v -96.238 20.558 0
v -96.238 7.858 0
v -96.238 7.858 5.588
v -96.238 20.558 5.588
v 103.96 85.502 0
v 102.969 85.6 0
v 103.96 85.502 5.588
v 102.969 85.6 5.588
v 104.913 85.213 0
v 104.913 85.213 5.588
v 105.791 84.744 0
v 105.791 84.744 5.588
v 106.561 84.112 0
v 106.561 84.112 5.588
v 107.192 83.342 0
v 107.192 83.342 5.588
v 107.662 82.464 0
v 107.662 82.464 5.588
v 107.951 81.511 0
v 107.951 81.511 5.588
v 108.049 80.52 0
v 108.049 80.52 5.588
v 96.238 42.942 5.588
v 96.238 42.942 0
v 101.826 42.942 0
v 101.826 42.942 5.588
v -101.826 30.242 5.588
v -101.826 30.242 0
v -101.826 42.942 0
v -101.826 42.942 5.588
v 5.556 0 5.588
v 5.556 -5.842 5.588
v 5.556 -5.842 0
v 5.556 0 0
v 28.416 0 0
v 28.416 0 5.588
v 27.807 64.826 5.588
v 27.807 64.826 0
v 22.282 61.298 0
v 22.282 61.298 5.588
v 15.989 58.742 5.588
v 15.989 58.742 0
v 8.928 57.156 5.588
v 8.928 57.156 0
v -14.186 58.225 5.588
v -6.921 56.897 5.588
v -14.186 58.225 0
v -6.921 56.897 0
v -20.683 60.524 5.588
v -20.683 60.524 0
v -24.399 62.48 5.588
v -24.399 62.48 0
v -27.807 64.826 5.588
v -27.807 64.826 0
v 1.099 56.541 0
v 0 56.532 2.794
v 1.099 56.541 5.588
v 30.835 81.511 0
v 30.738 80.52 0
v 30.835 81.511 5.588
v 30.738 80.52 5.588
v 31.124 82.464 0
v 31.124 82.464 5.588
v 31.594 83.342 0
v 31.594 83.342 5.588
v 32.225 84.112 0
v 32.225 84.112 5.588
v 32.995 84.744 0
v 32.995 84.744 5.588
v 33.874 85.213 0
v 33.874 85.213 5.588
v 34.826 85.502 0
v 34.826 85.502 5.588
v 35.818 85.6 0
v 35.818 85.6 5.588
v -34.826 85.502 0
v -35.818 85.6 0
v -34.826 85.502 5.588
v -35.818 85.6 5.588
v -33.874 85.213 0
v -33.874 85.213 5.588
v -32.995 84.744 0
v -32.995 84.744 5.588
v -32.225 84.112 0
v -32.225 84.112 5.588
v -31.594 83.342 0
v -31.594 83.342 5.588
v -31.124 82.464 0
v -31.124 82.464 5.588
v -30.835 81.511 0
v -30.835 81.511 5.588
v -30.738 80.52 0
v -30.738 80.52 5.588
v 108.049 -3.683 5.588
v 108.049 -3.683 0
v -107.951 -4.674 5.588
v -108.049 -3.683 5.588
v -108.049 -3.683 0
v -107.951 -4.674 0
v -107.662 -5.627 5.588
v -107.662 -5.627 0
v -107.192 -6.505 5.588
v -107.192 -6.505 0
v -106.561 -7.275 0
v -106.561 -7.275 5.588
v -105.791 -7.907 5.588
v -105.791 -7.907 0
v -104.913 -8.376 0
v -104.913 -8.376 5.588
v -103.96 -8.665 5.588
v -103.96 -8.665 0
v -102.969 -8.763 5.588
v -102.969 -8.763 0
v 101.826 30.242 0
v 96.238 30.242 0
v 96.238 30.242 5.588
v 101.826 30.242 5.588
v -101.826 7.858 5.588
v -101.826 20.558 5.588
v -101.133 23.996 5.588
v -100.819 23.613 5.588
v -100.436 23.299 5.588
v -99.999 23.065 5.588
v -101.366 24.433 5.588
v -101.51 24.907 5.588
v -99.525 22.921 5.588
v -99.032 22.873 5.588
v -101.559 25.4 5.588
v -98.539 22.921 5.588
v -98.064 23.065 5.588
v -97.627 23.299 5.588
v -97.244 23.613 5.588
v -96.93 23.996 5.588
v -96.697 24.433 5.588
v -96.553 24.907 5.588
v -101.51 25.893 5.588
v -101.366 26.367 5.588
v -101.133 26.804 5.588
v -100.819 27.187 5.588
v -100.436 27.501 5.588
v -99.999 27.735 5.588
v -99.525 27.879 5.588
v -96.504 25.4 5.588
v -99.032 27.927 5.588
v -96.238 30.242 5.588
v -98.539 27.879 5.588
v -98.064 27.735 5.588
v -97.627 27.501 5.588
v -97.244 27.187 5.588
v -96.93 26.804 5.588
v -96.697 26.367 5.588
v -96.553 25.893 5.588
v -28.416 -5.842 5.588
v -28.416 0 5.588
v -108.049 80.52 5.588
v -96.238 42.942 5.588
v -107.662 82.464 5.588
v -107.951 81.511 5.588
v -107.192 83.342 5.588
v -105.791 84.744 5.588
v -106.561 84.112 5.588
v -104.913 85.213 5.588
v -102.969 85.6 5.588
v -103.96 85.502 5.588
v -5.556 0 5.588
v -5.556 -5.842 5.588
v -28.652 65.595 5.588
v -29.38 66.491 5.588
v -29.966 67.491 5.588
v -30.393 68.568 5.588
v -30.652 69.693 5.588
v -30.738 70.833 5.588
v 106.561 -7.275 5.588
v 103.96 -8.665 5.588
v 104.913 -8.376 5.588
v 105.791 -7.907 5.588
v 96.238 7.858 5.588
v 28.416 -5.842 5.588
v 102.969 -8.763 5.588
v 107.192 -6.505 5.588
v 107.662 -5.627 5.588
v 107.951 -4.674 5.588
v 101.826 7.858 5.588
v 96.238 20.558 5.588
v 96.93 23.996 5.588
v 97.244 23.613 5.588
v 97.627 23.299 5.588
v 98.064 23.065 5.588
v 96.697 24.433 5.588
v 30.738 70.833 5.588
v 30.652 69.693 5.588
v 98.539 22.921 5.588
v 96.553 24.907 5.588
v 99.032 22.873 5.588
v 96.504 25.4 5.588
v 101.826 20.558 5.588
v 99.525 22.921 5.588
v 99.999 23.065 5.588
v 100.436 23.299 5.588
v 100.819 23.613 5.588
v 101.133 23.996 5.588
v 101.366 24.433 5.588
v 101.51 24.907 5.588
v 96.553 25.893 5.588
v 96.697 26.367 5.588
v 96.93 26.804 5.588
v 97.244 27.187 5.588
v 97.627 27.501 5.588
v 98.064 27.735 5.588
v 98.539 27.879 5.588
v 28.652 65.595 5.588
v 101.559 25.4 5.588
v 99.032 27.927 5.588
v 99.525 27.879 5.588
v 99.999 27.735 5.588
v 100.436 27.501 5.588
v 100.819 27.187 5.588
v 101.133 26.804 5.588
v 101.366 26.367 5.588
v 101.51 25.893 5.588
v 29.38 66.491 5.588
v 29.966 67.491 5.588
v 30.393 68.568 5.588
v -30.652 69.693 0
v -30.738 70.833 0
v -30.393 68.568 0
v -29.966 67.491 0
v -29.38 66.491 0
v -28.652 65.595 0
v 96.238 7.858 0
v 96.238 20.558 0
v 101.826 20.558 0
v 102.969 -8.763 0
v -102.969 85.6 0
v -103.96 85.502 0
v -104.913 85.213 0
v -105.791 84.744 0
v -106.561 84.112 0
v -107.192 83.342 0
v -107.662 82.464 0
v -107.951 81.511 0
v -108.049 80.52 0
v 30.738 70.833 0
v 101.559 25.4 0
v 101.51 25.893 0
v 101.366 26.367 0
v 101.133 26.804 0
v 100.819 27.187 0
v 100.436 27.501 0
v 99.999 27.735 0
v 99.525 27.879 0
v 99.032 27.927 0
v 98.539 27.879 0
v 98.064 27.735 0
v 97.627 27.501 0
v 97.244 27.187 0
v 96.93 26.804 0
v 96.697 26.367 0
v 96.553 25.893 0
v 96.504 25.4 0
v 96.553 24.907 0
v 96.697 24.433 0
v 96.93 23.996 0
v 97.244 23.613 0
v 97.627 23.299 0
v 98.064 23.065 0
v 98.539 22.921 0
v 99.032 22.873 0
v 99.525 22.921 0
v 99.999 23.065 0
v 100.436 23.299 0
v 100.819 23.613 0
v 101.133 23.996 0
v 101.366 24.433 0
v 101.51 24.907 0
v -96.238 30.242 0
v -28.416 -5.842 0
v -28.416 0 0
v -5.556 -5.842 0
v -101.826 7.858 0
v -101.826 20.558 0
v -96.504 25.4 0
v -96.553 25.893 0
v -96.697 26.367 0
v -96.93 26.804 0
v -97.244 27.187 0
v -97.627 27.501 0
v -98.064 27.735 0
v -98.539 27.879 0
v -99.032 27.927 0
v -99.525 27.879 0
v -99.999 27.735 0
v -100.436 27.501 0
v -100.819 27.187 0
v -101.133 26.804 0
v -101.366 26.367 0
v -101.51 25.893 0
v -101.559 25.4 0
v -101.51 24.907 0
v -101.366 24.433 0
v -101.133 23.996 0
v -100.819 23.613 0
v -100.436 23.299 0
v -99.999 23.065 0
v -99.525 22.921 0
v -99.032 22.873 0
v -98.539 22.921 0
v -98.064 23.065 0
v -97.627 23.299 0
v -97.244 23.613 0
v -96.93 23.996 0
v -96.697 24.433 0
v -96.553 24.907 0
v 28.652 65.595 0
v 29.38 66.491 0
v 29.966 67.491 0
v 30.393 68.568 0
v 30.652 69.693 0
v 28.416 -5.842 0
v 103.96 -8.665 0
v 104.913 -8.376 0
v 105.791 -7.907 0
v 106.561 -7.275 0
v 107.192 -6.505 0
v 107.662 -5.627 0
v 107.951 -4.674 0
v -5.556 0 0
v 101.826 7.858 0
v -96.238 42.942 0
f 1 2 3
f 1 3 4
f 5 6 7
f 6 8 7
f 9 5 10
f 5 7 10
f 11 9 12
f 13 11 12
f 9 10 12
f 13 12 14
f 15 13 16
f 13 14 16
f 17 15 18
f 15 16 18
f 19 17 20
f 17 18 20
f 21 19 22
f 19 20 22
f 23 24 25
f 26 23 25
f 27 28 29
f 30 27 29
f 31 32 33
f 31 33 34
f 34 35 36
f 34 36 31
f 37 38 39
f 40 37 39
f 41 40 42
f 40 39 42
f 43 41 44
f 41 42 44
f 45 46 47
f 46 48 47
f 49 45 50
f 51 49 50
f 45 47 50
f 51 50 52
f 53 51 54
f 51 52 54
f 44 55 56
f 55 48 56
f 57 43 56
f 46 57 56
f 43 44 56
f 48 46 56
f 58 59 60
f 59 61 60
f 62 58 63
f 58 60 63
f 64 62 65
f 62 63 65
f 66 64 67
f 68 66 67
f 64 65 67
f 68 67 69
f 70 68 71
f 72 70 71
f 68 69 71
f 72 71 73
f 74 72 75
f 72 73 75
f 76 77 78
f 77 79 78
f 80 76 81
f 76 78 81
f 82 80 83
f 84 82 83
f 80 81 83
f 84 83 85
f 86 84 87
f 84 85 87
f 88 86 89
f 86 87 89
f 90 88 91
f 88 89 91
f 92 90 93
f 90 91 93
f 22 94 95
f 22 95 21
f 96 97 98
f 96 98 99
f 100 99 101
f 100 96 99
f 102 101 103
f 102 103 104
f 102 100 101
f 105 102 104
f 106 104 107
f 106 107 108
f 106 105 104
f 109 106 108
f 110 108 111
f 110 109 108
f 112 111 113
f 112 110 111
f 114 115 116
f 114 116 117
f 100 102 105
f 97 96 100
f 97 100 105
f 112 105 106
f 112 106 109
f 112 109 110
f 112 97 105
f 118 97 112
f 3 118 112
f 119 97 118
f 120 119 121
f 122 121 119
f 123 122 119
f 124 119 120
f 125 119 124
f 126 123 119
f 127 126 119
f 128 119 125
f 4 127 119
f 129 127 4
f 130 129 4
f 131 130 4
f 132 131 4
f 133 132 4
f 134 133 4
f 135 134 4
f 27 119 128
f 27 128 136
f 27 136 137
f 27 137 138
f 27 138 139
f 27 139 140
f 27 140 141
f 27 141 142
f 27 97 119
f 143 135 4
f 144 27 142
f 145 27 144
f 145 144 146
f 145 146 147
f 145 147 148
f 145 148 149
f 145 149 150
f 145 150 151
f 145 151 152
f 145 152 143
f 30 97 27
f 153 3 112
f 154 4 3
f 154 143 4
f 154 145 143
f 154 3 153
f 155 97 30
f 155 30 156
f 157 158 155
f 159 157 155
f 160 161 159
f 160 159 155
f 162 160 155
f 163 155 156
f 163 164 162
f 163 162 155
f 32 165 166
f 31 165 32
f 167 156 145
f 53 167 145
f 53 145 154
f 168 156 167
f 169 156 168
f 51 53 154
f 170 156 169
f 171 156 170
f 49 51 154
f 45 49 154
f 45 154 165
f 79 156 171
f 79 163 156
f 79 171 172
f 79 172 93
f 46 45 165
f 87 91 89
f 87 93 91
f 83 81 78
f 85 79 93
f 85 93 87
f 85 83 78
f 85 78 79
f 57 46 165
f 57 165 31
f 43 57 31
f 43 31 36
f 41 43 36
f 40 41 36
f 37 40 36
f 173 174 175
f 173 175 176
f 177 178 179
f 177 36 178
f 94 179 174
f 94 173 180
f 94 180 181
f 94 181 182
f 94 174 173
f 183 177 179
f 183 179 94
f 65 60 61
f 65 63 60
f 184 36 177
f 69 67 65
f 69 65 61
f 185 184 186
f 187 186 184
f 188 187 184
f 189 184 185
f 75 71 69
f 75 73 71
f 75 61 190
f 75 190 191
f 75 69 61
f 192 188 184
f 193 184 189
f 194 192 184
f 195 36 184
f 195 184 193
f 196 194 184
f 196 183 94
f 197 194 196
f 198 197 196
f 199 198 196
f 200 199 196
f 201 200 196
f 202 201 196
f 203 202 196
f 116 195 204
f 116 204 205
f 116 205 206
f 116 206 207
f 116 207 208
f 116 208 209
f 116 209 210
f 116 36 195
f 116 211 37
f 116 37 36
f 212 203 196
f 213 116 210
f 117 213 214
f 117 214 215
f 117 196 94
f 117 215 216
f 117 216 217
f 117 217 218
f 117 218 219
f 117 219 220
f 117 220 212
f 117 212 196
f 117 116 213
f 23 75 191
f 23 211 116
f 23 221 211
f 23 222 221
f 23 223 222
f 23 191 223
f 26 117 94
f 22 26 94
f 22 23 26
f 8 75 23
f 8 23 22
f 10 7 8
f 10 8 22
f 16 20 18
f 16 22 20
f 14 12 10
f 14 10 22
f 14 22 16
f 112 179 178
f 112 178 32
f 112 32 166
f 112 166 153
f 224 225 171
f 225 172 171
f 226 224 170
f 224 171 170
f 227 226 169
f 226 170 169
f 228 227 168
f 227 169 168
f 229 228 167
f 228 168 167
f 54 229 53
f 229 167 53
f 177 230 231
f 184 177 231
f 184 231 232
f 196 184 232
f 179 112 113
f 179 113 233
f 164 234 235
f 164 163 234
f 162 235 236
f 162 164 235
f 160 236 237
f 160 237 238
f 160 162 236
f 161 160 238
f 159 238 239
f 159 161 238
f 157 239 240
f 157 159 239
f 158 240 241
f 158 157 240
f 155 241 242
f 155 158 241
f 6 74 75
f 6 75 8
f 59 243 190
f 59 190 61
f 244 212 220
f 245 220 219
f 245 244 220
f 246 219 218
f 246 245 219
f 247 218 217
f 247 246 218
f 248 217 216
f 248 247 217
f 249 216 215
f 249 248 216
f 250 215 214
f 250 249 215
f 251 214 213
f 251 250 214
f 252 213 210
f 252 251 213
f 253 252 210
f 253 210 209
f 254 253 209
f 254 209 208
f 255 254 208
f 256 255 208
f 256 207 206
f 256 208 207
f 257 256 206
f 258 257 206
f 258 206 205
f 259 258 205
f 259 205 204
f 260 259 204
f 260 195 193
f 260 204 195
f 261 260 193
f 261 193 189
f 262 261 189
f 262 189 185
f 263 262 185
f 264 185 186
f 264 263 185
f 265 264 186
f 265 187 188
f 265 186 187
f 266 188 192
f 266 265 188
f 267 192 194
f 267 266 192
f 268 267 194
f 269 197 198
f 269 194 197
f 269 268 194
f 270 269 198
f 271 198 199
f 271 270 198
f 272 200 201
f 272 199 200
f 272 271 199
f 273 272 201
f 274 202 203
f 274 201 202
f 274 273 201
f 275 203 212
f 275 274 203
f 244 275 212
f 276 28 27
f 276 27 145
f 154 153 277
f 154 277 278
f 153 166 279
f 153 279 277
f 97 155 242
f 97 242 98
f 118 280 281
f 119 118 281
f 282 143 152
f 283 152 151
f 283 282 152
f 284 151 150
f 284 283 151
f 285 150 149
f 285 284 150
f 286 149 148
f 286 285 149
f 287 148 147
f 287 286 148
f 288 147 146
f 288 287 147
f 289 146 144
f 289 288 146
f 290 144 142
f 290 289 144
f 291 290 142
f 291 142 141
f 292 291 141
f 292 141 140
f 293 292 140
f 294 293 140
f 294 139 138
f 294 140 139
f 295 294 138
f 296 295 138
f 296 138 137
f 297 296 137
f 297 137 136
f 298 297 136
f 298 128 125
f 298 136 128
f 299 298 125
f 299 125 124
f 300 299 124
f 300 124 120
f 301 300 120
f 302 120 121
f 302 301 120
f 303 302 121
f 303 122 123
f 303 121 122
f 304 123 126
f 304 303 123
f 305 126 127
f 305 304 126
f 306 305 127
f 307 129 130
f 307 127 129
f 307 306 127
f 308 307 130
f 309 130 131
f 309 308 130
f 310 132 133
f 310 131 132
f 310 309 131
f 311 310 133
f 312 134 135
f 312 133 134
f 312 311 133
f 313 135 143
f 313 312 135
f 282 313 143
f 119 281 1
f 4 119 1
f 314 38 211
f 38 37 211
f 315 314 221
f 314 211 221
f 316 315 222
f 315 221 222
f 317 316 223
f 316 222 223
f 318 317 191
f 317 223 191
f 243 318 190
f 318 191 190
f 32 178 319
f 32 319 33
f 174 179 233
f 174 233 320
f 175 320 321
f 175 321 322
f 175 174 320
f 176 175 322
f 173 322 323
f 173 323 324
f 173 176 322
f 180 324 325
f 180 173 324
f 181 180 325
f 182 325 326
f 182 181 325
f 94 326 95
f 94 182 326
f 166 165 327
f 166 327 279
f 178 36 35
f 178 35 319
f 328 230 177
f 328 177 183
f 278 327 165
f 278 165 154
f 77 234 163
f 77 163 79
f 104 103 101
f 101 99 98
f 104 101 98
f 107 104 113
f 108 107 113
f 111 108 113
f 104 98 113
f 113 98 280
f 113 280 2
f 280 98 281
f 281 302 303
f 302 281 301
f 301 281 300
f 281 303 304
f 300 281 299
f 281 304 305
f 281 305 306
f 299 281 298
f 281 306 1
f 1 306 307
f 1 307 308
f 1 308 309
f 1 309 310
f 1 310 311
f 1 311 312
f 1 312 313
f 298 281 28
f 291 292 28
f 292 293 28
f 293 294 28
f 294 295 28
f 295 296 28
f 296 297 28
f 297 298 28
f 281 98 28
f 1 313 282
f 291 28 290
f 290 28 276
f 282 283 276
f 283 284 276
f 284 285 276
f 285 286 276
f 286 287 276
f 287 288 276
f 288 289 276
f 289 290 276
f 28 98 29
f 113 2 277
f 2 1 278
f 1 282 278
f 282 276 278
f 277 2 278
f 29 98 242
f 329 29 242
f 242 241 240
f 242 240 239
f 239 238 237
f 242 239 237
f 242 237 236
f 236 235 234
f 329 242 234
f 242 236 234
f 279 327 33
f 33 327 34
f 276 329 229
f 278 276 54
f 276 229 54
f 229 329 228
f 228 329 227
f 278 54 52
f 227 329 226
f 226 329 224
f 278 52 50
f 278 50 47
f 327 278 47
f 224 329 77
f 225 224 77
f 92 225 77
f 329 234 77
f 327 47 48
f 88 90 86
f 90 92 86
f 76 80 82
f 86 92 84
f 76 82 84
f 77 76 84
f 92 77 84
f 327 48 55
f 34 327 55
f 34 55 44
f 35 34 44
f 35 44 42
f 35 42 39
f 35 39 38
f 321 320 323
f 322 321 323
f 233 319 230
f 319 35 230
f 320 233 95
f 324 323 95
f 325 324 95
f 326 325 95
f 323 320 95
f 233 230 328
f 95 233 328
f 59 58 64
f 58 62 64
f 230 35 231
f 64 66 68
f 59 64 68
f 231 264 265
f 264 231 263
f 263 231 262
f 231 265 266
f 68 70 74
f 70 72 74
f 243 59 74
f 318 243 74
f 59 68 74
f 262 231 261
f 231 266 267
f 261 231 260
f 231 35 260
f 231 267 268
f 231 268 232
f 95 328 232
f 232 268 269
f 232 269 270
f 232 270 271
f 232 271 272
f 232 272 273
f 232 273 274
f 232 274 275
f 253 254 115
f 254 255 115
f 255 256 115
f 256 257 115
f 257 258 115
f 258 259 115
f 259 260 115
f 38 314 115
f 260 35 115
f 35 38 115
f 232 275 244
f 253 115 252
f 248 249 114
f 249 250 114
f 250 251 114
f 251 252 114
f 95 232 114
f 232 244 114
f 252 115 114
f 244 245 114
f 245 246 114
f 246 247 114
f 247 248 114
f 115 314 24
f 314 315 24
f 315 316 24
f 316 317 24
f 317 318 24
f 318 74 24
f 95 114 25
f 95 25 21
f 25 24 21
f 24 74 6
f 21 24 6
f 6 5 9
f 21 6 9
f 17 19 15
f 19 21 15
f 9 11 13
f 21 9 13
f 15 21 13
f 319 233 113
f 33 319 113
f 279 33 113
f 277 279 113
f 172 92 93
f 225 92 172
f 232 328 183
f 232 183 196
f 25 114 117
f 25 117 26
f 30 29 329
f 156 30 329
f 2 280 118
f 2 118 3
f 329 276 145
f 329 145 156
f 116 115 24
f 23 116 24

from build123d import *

# Parameters (mm, degrees)
BOSS_EXTRUDE1_DEPTH = 5.588
FILLET1_R           = 5.08
FILLET3_R           = 7.62
SKETCH3_R           = 2.5273
SKETCH3_W           = 5.588
SKETCH3_H           = 12.7
CUT_EXTRUDE2_DEPTH  = 138.960432195
BOSS_EXTRUDE3_DEPTH = 5.588


with BuildPart() as part:
    # Sketch1 → Boss-Extrude1 (new body)
    with BuildSketch(Plane.XY):
        with BuildLine():
            Line((-108.048552, 85.600032), (-30.737556, 85.600032))
            Line((-30.737556, 85.600032), (-30.737556, 67.394105789))
            add(Edge.make_bspline(
                [(-30.737556, 67.394105789), (-19.663465212, 56.532474897), (0, 56.532474897)],
                knots=[0, 0, 0, 1, 1, 1], degree=2))
            add(Edge.make_bspline(
                [(30.737556, 67.394105789), (19.663465212, 56.532474897), (0, 56.532474897)],
                knots=[0, 0, 0, 1, 1, 1], degree=2))
            Line((30.737556, 67.394105789), (30.737556, 85.600032))
            Line((30.737556, 85.600032), (108.048552, 85.600032))
            Line((108.048552, 85.600032), (108.048552, 0))
            Line((108.048552, 0), (-108.048552, 0))
            Line((-108.048552, 0), (-108.048552, 85.600032))
        make_face()
    extrude(amount=BOSS_EXTRUDE1_DEPTH)

    # Fillet1
    fillet1_edges = [part.edges().sort_by_distance(p)[0] for p in [
        (30.737556, 85.600032, 2.794),
        (108.048552, 85.600032, 2.794),
        (108.048552, 0, 2.794),
        (-108.048552, 0, 2.794),
        (-108.048552, 85.600032, 2.794),
        (-30.737556, 85.600032, 2.794),
    ]]
    fillet(fillet1_edges, radius=FILLET1_R)

    # Fillet3
    fillet3_edges = [part.edges().sort_by_distance(p)[0] for p in [
        (30.737556, 67.394105789, 2.794),
        (-30.737556, 67.394105789, 2.794),
    ]]
    fillet(fillet3_edges, radius=FILLET3_R)

    # Sketch3 → Cut-Extrude2 (cut, through all)
    with BuildSketch(Plane.XY):
        with Locations((-99.031552, 25.4)):
            Circle(SKETCH3_R)
        with Locations((99.031552, 25.4)):
            Circle(SKETCH3_R)
        with Locations((-99.031552, 14.208252)):
            Rectangle(SKETCH3_W, SKETCH3_H)
        with Locations((99.031552, 14.208252)):
            Rectangle(SKETCH3_W, SKETCH3_H)
        with Locations((-99.031552, 36.591748)):
            Rectangle(SKETCH3_W, SKETCH3_H)
        with Locations((99.031552, 36.591748)):
            Rectangle(SKETCH3_W, SKETCH3_H)
    extrude(amount=CUT_EXTRUDE2_DEPTH, mode=Mode.SUBTRACT)

    # Sketch5 → Boss-Extrude3 (add)
    with BuildSketch(Plane.XY.offset(5.588)):
        with BuildLine():
            ThreePointArc((-102.968552, 0), (-106.560654448, 1.487897552), (-108.048552, 5.08))
            Line((-108.048552, 5.08), (-108.048552, -3.683))
            ThreePointArc((-108.048552, -3.683), (-106.560654448, -7.275102448), (-102.968552, -8.763))
            Line((-102.968552, -8.763), (102.968552, -8.763))
            ThreePointArc((102.968552, -8.763), (106.560654448, -7.275102448), (108.048552, -3.683))
            Line((108.048552, -3.683), (108.048552, 5.08))
            ThreePointArc((108.048552, 5.08), (106.560654448, 1.487897552), (102.968552, 0))
            Line((102.968552, 0), (28.41625, 0))
            Line((28.41625, 0), (28.41625, -5.842))
            Line((28.41625, -5.842), (5.55625, -5.842))
            Line((5.55625, -5.842), (5.55625, 0))
            Line((5.55625, 0), (-5.55625, 0))
            Line((-5.55625, 0), (-5.55625, -5.842))
            Line((-5.55625, -5.842), (-28.41625, -5.842))
            Line((-28.41625, -5.842), (-28.41625, 0))
            Line((-28.41625, 0), (-102.968552, 0))
        make_face()
    extrude(amount=-BOSS_EXTRUDE3_DEPTH)


solid = part.part
